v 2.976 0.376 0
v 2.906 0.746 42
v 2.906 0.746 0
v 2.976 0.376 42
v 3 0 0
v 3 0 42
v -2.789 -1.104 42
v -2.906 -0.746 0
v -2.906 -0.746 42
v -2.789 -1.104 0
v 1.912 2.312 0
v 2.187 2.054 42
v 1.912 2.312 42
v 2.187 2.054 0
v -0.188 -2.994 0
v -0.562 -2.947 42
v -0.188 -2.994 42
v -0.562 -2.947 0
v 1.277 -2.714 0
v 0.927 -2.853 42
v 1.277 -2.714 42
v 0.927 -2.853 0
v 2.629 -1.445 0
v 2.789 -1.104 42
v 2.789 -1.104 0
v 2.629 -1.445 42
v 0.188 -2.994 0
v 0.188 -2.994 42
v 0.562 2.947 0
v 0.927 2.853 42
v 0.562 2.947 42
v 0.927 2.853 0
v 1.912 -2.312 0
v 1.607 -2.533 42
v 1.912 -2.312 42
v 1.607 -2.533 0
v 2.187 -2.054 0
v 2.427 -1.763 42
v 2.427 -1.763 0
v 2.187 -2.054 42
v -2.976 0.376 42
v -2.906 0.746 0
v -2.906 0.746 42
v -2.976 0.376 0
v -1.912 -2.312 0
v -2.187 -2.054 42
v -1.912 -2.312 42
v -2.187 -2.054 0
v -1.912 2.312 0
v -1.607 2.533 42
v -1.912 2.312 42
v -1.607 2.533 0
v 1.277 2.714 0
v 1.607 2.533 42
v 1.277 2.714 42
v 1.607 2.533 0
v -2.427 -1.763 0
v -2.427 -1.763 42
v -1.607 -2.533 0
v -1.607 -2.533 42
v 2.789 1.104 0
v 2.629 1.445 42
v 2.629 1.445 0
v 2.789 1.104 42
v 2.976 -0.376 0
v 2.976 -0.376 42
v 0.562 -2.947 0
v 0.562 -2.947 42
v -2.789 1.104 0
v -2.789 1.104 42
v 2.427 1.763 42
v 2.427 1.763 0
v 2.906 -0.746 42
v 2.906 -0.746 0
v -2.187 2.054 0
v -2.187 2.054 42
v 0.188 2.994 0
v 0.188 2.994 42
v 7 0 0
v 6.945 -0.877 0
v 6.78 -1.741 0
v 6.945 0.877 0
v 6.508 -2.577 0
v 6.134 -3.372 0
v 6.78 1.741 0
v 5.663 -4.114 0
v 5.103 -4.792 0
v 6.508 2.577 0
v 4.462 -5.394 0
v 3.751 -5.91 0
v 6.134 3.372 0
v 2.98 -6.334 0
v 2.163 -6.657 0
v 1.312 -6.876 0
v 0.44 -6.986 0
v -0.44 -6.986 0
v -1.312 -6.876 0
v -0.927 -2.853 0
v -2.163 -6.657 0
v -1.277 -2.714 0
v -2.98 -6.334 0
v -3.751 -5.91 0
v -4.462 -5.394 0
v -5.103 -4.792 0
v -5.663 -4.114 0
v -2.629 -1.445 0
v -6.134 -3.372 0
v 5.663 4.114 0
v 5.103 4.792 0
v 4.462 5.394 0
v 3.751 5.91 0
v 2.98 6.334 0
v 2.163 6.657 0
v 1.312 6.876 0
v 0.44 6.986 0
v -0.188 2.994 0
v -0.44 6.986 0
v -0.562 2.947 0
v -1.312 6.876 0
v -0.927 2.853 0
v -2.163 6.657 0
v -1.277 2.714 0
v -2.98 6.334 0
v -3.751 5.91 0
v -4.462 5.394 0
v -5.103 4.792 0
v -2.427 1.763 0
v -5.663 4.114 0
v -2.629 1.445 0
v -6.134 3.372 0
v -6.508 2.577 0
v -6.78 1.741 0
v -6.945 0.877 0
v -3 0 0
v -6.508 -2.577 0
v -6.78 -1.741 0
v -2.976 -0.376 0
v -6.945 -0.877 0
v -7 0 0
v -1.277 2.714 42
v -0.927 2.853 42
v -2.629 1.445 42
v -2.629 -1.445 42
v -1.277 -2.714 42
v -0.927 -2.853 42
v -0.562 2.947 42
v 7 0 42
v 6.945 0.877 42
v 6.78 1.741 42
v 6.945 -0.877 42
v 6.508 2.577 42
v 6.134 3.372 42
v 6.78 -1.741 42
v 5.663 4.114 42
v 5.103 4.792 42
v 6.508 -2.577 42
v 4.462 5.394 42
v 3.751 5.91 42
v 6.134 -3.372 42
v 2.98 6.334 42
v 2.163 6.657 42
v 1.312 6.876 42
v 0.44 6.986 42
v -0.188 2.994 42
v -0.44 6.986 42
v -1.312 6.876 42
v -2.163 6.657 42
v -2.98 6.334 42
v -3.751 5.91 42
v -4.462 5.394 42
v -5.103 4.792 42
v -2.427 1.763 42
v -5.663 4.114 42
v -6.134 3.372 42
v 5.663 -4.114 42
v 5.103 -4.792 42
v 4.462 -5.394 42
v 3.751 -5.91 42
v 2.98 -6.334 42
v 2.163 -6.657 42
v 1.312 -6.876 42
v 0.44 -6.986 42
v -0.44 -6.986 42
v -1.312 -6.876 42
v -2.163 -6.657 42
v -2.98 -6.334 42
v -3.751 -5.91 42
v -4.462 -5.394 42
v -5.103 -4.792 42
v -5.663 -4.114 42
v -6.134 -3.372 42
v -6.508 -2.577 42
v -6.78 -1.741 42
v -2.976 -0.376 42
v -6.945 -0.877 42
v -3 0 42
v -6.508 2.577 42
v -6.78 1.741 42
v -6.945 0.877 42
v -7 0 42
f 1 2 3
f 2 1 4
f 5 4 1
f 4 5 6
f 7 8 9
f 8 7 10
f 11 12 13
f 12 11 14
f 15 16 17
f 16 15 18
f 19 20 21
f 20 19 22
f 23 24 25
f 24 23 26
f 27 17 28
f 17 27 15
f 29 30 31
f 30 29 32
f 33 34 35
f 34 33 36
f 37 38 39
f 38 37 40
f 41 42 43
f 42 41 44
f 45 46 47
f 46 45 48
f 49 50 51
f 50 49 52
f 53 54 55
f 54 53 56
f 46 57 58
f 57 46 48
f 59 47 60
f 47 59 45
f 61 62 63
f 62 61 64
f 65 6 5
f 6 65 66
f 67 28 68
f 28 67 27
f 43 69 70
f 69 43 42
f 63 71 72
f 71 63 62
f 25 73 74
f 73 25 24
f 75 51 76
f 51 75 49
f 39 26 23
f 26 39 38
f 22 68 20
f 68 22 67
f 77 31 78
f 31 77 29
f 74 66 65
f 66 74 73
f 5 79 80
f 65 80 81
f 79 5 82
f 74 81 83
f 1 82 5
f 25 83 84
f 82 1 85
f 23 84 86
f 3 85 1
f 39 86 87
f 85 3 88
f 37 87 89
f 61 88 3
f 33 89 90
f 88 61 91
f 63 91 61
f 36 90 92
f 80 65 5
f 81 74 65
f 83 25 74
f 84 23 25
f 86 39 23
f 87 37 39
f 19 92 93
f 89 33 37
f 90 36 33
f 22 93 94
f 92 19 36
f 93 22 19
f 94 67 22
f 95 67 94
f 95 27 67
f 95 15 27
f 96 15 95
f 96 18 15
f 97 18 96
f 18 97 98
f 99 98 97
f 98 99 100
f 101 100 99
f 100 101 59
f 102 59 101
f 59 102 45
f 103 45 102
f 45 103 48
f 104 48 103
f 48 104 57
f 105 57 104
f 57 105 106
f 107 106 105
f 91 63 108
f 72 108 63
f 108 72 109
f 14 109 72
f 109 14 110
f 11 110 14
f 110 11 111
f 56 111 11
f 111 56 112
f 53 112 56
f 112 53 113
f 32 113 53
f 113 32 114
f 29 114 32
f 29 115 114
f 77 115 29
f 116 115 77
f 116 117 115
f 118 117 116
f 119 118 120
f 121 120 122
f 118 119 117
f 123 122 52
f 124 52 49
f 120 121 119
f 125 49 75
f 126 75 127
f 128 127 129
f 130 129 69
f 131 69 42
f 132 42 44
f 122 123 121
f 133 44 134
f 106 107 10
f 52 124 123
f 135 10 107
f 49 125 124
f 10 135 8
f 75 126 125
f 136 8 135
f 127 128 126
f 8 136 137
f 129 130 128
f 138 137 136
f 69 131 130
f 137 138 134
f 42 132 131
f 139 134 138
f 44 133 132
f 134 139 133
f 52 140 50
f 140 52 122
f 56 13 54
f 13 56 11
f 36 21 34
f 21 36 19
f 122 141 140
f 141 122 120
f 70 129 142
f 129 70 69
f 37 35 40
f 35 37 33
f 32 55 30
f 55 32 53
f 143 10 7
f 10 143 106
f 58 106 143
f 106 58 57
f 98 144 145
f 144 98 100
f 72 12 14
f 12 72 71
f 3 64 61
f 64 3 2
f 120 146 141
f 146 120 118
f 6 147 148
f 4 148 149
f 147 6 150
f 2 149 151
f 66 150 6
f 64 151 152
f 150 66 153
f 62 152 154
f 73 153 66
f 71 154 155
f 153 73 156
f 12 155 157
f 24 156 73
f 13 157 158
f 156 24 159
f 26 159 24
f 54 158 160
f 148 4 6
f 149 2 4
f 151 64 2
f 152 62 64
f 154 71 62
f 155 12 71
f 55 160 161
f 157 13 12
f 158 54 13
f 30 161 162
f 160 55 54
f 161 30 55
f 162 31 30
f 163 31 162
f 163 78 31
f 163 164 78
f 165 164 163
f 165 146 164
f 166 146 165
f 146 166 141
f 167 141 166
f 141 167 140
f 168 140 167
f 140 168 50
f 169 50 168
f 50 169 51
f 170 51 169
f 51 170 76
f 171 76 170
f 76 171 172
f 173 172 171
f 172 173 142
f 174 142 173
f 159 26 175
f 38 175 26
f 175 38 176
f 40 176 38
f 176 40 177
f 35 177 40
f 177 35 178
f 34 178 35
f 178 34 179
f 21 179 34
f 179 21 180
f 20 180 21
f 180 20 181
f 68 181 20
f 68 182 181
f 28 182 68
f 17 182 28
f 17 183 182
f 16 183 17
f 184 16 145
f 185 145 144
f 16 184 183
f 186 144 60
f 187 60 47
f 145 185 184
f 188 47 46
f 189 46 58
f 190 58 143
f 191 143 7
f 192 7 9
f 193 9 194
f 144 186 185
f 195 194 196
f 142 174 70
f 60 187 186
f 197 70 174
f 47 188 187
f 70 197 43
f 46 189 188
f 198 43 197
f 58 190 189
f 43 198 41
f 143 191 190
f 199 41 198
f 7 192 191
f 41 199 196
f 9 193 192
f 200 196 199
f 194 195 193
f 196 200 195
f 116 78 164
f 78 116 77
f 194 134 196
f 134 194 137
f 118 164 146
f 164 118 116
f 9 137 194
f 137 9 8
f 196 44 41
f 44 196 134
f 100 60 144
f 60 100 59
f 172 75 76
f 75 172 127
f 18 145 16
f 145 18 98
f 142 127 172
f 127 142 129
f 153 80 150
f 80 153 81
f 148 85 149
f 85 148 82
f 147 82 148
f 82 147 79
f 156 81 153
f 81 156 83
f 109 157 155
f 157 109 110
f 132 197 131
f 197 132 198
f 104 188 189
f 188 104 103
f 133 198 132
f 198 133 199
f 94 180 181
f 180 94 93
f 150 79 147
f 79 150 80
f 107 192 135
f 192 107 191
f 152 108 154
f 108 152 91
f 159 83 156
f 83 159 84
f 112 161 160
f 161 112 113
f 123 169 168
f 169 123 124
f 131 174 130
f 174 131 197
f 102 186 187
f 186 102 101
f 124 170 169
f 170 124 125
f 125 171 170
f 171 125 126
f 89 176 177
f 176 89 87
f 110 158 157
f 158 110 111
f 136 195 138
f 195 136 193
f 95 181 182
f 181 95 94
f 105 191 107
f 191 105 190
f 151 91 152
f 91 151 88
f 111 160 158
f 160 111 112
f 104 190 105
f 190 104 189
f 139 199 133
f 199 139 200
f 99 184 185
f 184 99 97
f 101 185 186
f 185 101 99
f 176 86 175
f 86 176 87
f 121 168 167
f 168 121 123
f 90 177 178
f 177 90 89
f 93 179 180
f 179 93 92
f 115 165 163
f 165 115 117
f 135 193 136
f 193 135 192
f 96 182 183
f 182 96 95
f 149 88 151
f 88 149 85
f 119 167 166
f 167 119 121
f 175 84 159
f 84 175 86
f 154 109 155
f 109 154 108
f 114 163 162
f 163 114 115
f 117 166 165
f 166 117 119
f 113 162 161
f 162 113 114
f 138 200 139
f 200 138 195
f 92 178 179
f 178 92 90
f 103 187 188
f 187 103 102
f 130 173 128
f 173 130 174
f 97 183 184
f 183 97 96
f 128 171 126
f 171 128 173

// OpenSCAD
$fn = 50;


difference() {
	union() {
		cylinder(h = 42, r = 7.0000000000);
	}
	union() {
		cylinder(h = 42, r = 3.0000000000);
		cylinder(h = 42, r = 3.0000000000);
		cylinder(h = 42, r = 1.5000000000);
		cylinder(h = 42, r = 1.5000000000);
		cylinder(h = 42, r = 1.5000000000);
		cylinder(h = 42, r = 1.5000000000);
		cylinder(h = 42, r = 1.5000000000);
		cylinder(h = 42, r = 1.5000000000);
	}
}
